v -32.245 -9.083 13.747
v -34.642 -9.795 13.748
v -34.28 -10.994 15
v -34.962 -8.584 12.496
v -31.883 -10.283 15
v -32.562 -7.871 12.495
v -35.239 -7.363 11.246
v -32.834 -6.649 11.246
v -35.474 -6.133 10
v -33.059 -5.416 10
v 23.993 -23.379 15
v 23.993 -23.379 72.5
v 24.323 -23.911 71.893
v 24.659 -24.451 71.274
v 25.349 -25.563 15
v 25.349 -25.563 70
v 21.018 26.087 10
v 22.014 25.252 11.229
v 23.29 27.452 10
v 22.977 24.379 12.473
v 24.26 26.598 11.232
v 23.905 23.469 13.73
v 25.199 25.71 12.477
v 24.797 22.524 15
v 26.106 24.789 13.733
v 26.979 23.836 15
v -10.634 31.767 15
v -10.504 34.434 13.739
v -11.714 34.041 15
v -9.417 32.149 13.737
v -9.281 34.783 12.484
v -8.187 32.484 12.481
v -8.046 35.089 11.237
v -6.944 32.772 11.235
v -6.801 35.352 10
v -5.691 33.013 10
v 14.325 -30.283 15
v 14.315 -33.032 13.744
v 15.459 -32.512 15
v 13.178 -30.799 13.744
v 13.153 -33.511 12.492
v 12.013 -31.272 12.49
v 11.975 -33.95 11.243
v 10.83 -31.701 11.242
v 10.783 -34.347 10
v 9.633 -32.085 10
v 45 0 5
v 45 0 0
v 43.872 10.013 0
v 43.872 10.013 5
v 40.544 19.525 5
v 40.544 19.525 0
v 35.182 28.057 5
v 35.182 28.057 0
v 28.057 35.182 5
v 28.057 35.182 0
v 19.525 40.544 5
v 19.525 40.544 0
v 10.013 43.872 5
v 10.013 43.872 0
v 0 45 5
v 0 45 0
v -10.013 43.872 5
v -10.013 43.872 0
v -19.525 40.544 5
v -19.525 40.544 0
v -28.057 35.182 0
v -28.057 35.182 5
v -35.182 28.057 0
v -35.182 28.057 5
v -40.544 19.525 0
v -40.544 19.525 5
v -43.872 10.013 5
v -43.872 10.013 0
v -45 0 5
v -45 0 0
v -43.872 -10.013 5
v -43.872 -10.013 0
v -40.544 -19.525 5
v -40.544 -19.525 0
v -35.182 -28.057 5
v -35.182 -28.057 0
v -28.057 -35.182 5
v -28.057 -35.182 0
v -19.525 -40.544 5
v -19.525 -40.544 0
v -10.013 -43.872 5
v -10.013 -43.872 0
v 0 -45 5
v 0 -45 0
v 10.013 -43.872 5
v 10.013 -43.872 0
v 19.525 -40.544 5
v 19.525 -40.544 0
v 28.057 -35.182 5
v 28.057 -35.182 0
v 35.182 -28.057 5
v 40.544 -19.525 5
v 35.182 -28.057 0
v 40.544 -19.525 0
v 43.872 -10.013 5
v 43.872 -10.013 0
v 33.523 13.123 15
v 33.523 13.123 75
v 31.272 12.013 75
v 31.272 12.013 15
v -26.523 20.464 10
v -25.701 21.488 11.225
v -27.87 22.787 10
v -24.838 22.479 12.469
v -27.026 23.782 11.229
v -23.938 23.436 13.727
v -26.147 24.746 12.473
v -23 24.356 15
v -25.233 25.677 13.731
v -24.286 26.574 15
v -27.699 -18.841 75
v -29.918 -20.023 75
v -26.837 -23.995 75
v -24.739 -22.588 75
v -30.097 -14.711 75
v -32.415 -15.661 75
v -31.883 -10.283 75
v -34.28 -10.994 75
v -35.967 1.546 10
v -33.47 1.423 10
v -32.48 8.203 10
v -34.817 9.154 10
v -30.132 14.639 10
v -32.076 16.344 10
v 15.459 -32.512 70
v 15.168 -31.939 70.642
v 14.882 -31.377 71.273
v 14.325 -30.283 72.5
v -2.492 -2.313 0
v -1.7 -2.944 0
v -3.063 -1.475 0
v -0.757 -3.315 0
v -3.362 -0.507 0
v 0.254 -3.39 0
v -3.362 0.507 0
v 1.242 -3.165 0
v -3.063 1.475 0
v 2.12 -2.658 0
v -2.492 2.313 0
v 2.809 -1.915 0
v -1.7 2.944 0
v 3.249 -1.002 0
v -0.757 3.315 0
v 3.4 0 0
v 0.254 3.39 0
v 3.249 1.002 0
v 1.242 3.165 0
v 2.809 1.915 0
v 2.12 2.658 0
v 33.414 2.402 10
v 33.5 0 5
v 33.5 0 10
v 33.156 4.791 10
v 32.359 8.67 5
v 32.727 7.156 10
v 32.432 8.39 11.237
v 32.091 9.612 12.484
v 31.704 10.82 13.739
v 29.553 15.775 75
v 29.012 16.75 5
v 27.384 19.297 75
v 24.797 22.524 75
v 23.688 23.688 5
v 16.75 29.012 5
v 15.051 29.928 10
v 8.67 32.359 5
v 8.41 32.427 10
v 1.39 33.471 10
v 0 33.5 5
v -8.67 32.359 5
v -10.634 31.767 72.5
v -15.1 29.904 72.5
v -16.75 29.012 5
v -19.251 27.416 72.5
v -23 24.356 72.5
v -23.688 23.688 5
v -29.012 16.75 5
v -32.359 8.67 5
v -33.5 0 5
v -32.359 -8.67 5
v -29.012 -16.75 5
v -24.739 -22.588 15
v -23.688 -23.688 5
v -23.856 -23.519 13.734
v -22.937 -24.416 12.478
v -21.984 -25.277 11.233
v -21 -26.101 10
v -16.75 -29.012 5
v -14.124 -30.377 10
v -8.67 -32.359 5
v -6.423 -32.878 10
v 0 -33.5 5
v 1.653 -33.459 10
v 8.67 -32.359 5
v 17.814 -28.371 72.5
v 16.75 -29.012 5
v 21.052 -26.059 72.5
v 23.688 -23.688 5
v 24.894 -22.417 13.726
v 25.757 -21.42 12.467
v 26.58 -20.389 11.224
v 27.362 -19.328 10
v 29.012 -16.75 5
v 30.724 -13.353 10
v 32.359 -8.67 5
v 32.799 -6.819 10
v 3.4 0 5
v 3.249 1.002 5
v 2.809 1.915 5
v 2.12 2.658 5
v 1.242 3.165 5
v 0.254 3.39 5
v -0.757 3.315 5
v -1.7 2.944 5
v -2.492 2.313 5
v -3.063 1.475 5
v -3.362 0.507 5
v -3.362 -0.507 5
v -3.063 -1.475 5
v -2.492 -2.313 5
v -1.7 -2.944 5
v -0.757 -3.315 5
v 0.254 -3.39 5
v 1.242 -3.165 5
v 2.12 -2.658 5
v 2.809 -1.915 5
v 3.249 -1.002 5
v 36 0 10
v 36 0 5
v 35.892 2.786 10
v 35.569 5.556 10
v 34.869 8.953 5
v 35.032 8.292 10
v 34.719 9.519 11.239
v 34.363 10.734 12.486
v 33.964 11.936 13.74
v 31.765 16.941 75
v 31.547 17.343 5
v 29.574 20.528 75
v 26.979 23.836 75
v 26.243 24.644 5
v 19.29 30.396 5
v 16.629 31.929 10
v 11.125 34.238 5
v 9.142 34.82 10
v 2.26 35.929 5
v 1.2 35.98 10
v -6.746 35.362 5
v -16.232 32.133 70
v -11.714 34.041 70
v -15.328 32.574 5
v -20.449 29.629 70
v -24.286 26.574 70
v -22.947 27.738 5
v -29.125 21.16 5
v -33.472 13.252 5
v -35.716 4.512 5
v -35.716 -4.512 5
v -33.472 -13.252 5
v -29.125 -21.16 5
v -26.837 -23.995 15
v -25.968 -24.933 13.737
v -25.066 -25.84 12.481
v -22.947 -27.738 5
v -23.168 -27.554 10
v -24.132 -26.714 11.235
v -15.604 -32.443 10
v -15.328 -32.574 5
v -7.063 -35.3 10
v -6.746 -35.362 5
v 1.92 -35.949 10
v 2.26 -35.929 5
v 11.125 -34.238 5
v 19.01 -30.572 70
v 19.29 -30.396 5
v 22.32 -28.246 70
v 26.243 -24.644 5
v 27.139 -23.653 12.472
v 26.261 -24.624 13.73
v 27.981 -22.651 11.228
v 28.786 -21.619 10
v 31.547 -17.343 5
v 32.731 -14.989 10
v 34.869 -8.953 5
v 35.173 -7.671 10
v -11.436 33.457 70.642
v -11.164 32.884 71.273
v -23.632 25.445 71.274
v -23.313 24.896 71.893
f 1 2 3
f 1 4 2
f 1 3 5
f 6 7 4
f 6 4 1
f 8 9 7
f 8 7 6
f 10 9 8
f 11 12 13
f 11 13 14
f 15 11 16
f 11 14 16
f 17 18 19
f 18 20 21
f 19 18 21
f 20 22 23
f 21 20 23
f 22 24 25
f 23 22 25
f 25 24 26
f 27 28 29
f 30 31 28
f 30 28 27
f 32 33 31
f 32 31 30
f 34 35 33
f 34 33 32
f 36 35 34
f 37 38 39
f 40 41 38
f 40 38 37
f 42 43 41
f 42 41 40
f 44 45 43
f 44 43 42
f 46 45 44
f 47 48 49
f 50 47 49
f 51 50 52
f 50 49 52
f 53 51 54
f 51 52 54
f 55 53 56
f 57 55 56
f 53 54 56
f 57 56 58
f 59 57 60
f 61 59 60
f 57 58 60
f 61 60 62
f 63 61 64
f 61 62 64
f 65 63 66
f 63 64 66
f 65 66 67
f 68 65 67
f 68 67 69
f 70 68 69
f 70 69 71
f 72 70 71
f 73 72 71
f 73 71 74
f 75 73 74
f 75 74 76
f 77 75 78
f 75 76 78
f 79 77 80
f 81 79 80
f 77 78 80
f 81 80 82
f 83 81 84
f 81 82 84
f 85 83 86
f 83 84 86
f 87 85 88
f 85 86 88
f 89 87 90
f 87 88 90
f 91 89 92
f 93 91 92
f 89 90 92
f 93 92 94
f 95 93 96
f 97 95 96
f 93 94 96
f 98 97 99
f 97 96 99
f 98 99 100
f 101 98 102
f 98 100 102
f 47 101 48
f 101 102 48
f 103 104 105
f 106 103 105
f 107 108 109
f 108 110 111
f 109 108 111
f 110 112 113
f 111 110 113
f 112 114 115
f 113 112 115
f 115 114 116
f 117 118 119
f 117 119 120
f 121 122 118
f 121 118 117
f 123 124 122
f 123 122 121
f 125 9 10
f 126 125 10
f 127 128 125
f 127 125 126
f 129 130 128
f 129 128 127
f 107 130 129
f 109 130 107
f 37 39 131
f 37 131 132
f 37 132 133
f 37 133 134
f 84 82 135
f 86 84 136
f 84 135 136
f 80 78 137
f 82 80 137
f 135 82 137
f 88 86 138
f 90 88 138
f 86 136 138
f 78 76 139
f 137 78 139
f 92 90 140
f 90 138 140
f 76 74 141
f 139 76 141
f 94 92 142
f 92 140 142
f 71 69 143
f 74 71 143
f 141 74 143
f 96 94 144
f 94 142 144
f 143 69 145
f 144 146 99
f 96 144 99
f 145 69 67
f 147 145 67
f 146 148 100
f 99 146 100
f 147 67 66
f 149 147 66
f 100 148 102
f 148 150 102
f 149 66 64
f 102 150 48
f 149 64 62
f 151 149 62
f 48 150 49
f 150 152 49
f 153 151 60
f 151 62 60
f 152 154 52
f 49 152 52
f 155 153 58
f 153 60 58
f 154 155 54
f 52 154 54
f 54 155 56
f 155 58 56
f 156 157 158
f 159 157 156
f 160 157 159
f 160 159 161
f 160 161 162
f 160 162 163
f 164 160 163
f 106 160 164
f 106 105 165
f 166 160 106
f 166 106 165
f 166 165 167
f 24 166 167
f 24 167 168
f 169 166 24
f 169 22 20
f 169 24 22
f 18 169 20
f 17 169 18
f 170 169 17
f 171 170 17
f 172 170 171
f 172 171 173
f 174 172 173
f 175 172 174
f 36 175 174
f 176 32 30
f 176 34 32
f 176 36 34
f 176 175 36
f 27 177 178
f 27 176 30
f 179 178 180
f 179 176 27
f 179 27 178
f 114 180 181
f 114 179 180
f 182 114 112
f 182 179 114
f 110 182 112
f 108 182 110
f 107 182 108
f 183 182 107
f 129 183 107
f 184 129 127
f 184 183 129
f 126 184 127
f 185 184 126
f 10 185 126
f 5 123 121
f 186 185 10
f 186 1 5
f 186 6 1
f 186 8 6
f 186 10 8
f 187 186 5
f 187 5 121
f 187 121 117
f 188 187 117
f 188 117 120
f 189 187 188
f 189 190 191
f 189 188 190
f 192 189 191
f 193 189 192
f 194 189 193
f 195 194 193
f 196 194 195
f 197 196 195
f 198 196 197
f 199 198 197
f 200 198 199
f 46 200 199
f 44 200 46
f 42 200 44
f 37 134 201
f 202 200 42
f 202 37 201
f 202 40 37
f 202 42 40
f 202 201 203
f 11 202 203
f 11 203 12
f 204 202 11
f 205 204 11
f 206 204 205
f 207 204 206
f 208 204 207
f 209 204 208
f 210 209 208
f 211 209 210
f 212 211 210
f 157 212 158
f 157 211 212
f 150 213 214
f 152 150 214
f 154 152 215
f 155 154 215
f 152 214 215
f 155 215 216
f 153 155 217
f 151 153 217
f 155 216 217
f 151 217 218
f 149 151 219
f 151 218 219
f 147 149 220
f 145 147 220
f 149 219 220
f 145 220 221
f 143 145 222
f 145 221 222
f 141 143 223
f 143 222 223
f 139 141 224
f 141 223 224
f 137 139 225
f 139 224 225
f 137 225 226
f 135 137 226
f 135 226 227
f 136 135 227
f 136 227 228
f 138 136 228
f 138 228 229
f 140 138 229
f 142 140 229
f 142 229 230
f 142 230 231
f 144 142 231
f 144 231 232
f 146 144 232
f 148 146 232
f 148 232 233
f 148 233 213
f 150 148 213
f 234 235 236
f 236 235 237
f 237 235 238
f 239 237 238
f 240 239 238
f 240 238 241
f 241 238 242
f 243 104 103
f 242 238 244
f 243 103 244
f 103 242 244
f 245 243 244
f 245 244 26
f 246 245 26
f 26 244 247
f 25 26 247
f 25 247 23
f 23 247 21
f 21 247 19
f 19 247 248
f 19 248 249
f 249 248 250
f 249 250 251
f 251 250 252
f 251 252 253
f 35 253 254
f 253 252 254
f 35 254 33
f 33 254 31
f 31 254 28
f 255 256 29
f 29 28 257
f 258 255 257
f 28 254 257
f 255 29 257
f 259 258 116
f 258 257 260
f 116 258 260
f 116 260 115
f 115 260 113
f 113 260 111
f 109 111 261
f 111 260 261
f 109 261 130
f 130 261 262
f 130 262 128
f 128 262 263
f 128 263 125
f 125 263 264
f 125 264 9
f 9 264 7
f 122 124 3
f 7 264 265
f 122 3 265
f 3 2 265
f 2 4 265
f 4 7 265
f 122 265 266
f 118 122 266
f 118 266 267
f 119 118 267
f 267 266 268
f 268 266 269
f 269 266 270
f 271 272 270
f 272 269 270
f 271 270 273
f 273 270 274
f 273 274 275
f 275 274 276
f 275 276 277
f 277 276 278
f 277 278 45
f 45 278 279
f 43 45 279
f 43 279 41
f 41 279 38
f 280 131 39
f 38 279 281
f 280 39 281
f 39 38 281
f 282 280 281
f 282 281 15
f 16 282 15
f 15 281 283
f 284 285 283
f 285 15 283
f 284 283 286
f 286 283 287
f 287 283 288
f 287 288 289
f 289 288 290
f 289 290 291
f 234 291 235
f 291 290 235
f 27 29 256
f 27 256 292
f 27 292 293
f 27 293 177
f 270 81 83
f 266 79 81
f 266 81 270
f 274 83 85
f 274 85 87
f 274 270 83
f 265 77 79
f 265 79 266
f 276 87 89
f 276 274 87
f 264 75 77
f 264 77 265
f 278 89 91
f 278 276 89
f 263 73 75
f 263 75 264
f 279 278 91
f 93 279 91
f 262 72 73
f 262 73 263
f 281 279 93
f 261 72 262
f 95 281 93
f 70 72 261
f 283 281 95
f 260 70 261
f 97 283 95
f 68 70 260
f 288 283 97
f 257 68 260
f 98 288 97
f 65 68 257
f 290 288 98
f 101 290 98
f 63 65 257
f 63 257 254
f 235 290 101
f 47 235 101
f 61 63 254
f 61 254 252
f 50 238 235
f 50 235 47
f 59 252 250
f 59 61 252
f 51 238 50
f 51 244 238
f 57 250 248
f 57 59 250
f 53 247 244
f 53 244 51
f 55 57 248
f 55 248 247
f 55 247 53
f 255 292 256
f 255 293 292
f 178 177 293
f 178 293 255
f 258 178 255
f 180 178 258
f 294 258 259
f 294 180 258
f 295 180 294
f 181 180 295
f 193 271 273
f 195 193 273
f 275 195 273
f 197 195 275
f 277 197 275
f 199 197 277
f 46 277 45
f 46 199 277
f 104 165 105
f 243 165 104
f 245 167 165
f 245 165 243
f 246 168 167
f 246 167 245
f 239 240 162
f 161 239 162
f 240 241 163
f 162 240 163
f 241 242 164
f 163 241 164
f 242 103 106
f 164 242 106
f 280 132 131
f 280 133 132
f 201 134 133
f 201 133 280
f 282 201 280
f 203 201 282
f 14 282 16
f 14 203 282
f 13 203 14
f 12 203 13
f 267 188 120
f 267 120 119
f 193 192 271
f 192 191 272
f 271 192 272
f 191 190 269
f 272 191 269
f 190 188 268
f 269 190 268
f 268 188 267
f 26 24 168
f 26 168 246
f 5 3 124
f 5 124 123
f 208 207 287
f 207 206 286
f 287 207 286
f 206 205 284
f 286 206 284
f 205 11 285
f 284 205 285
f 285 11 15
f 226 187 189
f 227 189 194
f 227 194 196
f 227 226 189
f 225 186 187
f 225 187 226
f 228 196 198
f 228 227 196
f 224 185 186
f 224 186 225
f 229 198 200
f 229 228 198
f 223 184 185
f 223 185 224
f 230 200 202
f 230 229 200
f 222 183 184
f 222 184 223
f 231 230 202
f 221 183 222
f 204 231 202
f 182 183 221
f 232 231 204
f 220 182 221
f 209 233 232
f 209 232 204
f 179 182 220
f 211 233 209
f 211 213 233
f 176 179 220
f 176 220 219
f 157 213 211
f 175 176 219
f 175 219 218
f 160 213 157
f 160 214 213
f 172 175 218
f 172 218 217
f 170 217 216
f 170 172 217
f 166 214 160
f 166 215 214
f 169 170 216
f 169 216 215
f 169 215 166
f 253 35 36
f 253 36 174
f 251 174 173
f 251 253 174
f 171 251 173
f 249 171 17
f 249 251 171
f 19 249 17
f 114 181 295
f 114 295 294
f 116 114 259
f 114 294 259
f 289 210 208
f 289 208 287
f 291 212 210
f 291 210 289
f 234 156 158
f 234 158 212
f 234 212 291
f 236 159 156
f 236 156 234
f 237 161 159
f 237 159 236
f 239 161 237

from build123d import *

# Parameters (mm, degrees)
F0_R        = 45
F1_DEPTH    = 5
F2_R        = 36
F2_R_2      = 33.5
F3_DEPTH    = 70
F5_DEPTH    = 65
F6_R        = 3.4
F7_DEPTH    = 5.001
F8_T2_ANGLE = 64.3663587264
F8_T4_ANGLE = 60.259047326
F9_SIZE     = 5


# Not quite as in the source:
# - a fillet or chamfer that OpenCascade refuses, or shapes differently, is made with other operations: its cross-section is extruded or revolved along the edge and cut away or added


with BuildPart() as f1:
    # F0 (on Top) → F1 (new body)
    with BuildSketch(Plane.XY):
        Circle(F0_R)
    extrude(amount=F1_DEPTH)

    # F2 (on face) → F3 (join)
    with BuildSketch(Plane.XY.offset(5)):
        Circle(F2_R)
        Circle(F2_R_2, mode=Mode.SUBTRACT)
    extrude(amount=F3_DEPTH)

    # F4 (on face) → F5 (cut)
    with BuildSketch(Plane.XY.offset(75)):
        with BuildLine():
            Line((-23.0004066086, 24.3563399516), (-24.2860665521, 26.5741786595))
            ThreePointArc((-24.2860665521, 26.5741786595), (-34.7900436906, 9.2548830357), (-34.2800852695, -10.9943510002))
            Line((-34.2800852695, -10.9943510002), (-31.8828522812, -10.2826908158))
            ThreePointArc((-31.8828522812, -10.2826908158), (-32.4500946026, 8.321139362), (-23.0004066086, 24.3563399516))
        make_face()
        with BuildLine():
            ThreePointArc((26.9790229265, 23.8355264664), (9.1813045472, 34.8095338494), (-11.7135995274, 34.0410279826))
            Line((-11.7135995274, 34.0410279826), (-10.6344524928, 31.7672538973))
            ThreePointArc((-10.6344524928, 31.7672538973), (8.4559678958, 32.4152218401), (24.7971983706, 22.5244079383))
            Line((24.7971983706, 22.5244079383), (26.9790229265, 23.8355264664))
        make_face()
        with BuildLine():
            ThreePointArc((36, 0), (35.3753586598, 6.6771251068), (33.5231111282, 13.1225386373))
            Line((33.5231111282, 13.1225386373), (31.2720148564, 12.012954958))
            ThreePointArc((31.2720148564, 12.012954958), (32.9382945649, 6.1089075256), (33.5, 0))
            ThreePointArc((33.5, 0), (31.0323255924, -12.619222176), (23.9928496521, -23.3793320173))
            Line((23.9928496521, -23.3793320173), (25.3486350697, -25.562603547))
            ThreePointArc((25.3486350697, -25.562603547), (33.2306399465, -13.8464641243), (36, 0))
        make_face()
        with BuildLine():
            Line((-24.739174036, -22.5881222774), (-26.8374439413, -23.9948244982))
            ThreePointArc((-26.8374439413, -23.9948244982), (-7.1064924362, -35.2916104089), (15.4589834804, -32.5118413775))
            Line((15.4589834804, -32.5118413775), (14.3252158119, -30.2826384574))
            ThreePointArc((14.3252158119, -30.2826384574), (-6.4741042843, -32.8684647301), (-24.739174036, -22.5881222774))
        make_face()
    extrude(amount=-F5_DEPTH, mode=Mode.SUBTRACT)

    # F6 (on face) → F7 (cut, through all)
    with BuildSketch(Plane.XY.offset(5)):
        Circle(F6_R)
    extrude(amount=-F7_DEPTH, mode=Mode.SUBTRACT)

    # F8: chamfer of 5 on 2 edges, made by hand

    # F8_s1 → F8_t2 (revolve, cut)
    with BuildSketch(Plane(origin=(0, 0, 0), x_dir=(0, 0, 1), z_dir=(0.9996677989, -0.0257738601, 0))):
        Polygon((70, -36), (75, -31), (75, -36), align=None)
    revolve(axis=Axis((0, 0, 75), (0, 0, 1)), revolution_arc=F8_T2_ANGLE, mode=Mode.SUBTRACT)

    # F8_s3 → F8_t4 (revolve, cut)
    with BuildSketch(Plane(origin=(0, 0, 0), x_dir=(0, 0, 1), z_dir=(-0.9962472468, -0.0865530086, 0))):
        Polygon((70, -36), (75, -31), (75, -36), align=None)
    revolve(axis=Axis((0, 0, 75), (0, 0, 1)), revolution_arc=F8_T4_ANGLE, mode=Mode.SUBTRACT)

    # F9
    f9_edges = [f1.edges().sort_by_distance(p)[0] for p in [
        (-23.643237, 25.465259, 10),
        (-11.174026, 32.904141, 10),
        (25.888111, 23.179967, 10),
        (32.397563, 12.567747, 10),
        (24.670742, -24.470968, 10),
        (14.8921, -31.39724, 10),
        (-25.788309, -23.291473, 10),
        (-33.081469, -10.638521, 10),
    ]]
    chamfer(f9_edges, length=F9_SIZE)


solid = f1.part
